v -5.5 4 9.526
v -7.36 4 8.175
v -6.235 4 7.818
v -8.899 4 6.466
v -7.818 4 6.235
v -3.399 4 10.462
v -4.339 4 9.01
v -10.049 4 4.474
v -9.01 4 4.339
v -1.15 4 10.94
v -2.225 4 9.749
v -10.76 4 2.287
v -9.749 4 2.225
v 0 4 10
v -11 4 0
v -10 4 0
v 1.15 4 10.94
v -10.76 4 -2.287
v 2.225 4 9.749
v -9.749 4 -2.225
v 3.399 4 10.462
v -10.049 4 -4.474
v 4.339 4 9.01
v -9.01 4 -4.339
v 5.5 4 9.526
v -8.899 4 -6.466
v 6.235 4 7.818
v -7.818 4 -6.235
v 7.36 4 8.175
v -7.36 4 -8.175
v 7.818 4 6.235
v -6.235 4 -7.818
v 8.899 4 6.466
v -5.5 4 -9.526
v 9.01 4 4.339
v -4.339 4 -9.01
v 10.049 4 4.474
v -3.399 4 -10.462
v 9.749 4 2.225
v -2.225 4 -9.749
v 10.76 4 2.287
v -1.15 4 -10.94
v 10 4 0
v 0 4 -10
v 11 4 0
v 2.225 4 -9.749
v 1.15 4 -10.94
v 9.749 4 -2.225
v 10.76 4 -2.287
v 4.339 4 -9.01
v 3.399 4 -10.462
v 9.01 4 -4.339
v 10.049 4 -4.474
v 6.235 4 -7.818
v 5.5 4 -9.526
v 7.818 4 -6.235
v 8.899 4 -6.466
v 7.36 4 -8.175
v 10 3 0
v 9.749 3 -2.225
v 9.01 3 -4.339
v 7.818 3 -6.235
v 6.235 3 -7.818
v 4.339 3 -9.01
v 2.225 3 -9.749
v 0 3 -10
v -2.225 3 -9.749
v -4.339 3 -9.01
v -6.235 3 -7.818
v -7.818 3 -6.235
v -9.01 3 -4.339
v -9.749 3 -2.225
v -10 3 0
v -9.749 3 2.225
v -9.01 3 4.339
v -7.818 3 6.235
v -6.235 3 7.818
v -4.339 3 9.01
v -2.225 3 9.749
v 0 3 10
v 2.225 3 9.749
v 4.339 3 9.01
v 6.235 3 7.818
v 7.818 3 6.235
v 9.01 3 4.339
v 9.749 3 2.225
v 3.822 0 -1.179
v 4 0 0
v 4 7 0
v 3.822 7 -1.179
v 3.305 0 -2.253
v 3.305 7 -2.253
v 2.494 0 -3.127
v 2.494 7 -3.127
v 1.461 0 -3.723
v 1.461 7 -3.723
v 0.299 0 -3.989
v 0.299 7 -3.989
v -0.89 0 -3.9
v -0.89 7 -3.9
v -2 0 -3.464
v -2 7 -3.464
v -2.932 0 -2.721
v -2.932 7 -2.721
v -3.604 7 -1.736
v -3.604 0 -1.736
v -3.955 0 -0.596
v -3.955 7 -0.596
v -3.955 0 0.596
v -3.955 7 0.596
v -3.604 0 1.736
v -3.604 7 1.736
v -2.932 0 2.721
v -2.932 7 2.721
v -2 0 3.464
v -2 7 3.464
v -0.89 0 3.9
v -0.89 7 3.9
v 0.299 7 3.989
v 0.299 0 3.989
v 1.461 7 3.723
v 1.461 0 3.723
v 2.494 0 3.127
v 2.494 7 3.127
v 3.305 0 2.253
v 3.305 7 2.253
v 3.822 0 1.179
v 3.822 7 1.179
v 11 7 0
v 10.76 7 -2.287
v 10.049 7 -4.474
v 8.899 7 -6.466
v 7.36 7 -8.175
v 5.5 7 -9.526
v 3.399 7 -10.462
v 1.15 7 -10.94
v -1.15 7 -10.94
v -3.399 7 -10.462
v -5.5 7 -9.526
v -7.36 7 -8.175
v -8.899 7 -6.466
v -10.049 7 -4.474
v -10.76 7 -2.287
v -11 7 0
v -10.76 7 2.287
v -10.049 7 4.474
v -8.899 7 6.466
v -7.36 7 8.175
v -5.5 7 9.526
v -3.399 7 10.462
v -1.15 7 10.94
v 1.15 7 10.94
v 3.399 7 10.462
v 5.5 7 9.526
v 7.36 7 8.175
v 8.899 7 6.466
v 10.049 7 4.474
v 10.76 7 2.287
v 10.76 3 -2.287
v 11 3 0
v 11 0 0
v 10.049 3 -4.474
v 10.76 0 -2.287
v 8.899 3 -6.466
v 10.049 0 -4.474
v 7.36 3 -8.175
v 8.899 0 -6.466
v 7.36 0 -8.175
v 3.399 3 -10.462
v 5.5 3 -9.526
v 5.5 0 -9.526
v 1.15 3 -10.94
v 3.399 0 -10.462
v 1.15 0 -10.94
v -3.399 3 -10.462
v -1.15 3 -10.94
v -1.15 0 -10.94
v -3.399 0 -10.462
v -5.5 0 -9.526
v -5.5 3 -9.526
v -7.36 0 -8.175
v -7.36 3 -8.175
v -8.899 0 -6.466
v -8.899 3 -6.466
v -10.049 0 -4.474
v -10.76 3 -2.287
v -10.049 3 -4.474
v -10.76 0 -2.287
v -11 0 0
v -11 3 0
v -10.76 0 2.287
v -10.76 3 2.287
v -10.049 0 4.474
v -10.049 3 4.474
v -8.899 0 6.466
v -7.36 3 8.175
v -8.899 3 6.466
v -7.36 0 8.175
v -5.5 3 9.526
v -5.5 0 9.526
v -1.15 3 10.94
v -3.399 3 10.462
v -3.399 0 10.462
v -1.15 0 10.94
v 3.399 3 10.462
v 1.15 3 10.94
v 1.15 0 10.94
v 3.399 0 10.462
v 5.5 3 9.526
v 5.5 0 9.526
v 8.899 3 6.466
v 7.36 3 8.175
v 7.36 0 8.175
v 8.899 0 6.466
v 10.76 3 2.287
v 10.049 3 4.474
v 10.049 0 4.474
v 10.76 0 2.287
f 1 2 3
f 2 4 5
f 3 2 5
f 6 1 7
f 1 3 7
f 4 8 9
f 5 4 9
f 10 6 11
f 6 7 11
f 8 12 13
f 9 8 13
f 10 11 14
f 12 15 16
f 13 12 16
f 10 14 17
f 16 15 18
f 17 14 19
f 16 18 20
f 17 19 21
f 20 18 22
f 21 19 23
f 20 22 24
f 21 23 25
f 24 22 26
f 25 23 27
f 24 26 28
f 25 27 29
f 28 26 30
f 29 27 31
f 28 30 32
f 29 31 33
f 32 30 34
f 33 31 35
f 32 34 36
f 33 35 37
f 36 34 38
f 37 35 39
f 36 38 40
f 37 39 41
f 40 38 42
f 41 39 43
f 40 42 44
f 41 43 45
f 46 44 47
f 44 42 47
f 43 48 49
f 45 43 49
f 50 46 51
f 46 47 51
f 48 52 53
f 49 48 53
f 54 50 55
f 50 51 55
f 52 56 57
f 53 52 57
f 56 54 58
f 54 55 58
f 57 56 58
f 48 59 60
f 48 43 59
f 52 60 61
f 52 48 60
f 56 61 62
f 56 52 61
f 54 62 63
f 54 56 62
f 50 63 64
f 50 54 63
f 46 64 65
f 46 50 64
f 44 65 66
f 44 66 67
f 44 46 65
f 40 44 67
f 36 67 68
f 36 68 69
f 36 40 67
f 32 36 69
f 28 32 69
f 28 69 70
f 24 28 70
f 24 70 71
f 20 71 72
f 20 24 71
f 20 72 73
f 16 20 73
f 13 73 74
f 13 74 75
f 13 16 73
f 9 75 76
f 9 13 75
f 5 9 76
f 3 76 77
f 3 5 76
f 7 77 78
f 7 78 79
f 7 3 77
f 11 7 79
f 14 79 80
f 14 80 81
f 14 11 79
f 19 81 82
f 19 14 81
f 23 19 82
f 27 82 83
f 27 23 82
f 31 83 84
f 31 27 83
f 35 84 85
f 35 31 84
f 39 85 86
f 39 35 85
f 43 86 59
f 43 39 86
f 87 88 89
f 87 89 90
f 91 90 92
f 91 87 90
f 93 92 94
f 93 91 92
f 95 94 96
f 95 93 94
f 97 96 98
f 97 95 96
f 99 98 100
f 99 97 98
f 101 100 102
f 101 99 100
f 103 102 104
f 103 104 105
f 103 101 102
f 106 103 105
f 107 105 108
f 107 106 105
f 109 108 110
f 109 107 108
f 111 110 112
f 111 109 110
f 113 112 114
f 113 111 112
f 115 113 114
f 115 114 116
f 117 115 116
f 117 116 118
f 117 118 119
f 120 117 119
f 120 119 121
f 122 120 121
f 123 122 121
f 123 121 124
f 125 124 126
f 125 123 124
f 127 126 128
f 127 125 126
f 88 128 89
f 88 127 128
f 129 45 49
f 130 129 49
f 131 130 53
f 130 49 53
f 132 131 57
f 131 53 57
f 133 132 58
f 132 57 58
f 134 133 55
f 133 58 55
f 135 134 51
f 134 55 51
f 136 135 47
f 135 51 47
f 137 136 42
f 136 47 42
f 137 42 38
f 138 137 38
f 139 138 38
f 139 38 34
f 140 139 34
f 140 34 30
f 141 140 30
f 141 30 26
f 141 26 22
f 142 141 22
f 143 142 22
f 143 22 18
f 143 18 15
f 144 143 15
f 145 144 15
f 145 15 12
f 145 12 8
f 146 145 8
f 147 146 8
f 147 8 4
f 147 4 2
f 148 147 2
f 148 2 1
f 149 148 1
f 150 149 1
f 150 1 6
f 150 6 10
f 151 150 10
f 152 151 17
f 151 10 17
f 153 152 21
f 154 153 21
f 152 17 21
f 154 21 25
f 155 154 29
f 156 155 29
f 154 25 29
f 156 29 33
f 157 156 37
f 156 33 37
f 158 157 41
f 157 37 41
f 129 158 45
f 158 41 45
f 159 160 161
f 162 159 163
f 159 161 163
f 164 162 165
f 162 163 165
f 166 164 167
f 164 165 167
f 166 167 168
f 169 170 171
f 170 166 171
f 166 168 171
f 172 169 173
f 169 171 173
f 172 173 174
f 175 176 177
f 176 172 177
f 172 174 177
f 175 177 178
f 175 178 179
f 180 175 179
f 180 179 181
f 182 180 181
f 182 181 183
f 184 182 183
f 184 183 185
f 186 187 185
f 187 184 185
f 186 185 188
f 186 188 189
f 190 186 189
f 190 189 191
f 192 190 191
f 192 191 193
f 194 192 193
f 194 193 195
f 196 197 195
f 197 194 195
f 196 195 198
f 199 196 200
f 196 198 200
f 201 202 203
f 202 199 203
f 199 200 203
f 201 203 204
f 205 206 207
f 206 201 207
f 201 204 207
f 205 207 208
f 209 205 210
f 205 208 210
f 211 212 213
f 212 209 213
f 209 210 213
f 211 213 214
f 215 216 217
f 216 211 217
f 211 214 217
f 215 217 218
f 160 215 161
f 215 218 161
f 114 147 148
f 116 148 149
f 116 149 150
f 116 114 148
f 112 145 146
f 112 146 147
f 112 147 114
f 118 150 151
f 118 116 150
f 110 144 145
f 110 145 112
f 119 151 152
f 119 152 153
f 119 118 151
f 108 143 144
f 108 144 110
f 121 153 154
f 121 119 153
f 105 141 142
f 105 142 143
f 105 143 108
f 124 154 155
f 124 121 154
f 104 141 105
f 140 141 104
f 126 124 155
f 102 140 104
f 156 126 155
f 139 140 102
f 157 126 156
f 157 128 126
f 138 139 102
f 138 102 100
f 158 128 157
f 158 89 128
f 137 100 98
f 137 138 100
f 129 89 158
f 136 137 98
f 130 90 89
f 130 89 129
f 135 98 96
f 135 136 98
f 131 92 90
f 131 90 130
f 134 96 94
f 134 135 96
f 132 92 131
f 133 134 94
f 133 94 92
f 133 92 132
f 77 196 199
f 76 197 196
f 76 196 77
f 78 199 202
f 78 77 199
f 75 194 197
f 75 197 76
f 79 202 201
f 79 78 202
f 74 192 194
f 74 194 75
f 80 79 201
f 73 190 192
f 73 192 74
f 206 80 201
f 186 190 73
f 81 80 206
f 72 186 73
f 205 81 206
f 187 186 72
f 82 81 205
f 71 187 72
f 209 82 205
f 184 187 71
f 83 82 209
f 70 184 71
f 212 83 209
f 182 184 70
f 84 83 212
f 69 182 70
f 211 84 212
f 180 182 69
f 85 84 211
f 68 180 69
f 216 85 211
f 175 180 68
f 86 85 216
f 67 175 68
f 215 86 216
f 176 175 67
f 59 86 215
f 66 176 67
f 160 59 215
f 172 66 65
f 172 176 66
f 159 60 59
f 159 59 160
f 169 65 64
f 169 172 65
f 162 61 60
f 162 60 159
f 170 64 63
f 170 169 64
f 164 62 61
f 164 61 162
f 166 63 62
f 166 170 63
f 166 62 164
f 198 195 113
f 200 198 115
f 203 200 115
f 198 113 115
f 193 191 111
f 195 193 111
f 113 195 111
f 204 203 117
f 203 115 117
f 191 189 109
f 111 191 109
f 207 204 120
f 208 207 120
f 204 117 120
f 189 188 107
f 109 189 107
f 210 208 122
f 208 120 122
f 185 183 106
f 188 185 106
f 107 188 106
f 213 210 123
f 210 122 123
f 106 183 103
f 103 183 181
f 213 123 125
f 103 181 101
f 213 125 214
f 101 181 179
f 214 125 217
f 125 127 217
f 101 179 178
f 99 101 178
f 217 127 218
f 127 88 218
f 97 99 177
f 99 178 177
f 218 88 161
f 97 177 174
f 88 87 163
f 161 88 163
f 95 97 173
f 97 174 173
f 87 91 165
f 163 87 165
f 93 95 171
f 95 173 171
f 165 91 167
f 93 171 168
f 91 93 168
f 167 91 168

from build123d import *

# Parameters (mm, degrees)
SKETCH_1_R               = 11
SKETCH_1_R_2             = 4
EXTRUDE_1_DEPTH          = 7
SKETCH_2_R               = 12
SKETCH_2_R_2             = 10
CUT_EXTRUDE_1_DEPTH      = 0.5
CUT_EXTRUDE_1_DEPTH_BACK = 0.5


with BuildPart() as part:
    # 草图1 → 凸台-拉伸1 (new body)
    with BuildSketch(Plane(origin=(0, 0, 0), x_dir=(1, 0, 0), z_dir=(0, 1, 0))):
        Circle(SKETCH_1_R)
        Circle(SKETCH_1_R_2, mode=Mode.SUBTRACT)
    extrude(amount=EXTRUDE_1_DEPTH)

    # 草图2 → 切除-拉伸1 (cut, two sides)
    with BuildSketch(Plane(origin=(0, 3.5, 0), x_dir=(1, 0, 0), z_dir=(0, 1, 0))) as cut_extrude_1_sk:
        Circle(SKETCH_2_R)
        Circle(SKETCH_2_R_2, mode=Mode.SUBTRACT)
    extrude(amount=CUT_EXTRUDE_1_DEPTH, mode=Mode.SUBTRACT)
    extrude(cut_extrude_1_sk.sketch, amount=-CUT_EXTRUDE_1_DEPTH_BACK, mode=Mode.SUBTRACT)


solid = part.part
